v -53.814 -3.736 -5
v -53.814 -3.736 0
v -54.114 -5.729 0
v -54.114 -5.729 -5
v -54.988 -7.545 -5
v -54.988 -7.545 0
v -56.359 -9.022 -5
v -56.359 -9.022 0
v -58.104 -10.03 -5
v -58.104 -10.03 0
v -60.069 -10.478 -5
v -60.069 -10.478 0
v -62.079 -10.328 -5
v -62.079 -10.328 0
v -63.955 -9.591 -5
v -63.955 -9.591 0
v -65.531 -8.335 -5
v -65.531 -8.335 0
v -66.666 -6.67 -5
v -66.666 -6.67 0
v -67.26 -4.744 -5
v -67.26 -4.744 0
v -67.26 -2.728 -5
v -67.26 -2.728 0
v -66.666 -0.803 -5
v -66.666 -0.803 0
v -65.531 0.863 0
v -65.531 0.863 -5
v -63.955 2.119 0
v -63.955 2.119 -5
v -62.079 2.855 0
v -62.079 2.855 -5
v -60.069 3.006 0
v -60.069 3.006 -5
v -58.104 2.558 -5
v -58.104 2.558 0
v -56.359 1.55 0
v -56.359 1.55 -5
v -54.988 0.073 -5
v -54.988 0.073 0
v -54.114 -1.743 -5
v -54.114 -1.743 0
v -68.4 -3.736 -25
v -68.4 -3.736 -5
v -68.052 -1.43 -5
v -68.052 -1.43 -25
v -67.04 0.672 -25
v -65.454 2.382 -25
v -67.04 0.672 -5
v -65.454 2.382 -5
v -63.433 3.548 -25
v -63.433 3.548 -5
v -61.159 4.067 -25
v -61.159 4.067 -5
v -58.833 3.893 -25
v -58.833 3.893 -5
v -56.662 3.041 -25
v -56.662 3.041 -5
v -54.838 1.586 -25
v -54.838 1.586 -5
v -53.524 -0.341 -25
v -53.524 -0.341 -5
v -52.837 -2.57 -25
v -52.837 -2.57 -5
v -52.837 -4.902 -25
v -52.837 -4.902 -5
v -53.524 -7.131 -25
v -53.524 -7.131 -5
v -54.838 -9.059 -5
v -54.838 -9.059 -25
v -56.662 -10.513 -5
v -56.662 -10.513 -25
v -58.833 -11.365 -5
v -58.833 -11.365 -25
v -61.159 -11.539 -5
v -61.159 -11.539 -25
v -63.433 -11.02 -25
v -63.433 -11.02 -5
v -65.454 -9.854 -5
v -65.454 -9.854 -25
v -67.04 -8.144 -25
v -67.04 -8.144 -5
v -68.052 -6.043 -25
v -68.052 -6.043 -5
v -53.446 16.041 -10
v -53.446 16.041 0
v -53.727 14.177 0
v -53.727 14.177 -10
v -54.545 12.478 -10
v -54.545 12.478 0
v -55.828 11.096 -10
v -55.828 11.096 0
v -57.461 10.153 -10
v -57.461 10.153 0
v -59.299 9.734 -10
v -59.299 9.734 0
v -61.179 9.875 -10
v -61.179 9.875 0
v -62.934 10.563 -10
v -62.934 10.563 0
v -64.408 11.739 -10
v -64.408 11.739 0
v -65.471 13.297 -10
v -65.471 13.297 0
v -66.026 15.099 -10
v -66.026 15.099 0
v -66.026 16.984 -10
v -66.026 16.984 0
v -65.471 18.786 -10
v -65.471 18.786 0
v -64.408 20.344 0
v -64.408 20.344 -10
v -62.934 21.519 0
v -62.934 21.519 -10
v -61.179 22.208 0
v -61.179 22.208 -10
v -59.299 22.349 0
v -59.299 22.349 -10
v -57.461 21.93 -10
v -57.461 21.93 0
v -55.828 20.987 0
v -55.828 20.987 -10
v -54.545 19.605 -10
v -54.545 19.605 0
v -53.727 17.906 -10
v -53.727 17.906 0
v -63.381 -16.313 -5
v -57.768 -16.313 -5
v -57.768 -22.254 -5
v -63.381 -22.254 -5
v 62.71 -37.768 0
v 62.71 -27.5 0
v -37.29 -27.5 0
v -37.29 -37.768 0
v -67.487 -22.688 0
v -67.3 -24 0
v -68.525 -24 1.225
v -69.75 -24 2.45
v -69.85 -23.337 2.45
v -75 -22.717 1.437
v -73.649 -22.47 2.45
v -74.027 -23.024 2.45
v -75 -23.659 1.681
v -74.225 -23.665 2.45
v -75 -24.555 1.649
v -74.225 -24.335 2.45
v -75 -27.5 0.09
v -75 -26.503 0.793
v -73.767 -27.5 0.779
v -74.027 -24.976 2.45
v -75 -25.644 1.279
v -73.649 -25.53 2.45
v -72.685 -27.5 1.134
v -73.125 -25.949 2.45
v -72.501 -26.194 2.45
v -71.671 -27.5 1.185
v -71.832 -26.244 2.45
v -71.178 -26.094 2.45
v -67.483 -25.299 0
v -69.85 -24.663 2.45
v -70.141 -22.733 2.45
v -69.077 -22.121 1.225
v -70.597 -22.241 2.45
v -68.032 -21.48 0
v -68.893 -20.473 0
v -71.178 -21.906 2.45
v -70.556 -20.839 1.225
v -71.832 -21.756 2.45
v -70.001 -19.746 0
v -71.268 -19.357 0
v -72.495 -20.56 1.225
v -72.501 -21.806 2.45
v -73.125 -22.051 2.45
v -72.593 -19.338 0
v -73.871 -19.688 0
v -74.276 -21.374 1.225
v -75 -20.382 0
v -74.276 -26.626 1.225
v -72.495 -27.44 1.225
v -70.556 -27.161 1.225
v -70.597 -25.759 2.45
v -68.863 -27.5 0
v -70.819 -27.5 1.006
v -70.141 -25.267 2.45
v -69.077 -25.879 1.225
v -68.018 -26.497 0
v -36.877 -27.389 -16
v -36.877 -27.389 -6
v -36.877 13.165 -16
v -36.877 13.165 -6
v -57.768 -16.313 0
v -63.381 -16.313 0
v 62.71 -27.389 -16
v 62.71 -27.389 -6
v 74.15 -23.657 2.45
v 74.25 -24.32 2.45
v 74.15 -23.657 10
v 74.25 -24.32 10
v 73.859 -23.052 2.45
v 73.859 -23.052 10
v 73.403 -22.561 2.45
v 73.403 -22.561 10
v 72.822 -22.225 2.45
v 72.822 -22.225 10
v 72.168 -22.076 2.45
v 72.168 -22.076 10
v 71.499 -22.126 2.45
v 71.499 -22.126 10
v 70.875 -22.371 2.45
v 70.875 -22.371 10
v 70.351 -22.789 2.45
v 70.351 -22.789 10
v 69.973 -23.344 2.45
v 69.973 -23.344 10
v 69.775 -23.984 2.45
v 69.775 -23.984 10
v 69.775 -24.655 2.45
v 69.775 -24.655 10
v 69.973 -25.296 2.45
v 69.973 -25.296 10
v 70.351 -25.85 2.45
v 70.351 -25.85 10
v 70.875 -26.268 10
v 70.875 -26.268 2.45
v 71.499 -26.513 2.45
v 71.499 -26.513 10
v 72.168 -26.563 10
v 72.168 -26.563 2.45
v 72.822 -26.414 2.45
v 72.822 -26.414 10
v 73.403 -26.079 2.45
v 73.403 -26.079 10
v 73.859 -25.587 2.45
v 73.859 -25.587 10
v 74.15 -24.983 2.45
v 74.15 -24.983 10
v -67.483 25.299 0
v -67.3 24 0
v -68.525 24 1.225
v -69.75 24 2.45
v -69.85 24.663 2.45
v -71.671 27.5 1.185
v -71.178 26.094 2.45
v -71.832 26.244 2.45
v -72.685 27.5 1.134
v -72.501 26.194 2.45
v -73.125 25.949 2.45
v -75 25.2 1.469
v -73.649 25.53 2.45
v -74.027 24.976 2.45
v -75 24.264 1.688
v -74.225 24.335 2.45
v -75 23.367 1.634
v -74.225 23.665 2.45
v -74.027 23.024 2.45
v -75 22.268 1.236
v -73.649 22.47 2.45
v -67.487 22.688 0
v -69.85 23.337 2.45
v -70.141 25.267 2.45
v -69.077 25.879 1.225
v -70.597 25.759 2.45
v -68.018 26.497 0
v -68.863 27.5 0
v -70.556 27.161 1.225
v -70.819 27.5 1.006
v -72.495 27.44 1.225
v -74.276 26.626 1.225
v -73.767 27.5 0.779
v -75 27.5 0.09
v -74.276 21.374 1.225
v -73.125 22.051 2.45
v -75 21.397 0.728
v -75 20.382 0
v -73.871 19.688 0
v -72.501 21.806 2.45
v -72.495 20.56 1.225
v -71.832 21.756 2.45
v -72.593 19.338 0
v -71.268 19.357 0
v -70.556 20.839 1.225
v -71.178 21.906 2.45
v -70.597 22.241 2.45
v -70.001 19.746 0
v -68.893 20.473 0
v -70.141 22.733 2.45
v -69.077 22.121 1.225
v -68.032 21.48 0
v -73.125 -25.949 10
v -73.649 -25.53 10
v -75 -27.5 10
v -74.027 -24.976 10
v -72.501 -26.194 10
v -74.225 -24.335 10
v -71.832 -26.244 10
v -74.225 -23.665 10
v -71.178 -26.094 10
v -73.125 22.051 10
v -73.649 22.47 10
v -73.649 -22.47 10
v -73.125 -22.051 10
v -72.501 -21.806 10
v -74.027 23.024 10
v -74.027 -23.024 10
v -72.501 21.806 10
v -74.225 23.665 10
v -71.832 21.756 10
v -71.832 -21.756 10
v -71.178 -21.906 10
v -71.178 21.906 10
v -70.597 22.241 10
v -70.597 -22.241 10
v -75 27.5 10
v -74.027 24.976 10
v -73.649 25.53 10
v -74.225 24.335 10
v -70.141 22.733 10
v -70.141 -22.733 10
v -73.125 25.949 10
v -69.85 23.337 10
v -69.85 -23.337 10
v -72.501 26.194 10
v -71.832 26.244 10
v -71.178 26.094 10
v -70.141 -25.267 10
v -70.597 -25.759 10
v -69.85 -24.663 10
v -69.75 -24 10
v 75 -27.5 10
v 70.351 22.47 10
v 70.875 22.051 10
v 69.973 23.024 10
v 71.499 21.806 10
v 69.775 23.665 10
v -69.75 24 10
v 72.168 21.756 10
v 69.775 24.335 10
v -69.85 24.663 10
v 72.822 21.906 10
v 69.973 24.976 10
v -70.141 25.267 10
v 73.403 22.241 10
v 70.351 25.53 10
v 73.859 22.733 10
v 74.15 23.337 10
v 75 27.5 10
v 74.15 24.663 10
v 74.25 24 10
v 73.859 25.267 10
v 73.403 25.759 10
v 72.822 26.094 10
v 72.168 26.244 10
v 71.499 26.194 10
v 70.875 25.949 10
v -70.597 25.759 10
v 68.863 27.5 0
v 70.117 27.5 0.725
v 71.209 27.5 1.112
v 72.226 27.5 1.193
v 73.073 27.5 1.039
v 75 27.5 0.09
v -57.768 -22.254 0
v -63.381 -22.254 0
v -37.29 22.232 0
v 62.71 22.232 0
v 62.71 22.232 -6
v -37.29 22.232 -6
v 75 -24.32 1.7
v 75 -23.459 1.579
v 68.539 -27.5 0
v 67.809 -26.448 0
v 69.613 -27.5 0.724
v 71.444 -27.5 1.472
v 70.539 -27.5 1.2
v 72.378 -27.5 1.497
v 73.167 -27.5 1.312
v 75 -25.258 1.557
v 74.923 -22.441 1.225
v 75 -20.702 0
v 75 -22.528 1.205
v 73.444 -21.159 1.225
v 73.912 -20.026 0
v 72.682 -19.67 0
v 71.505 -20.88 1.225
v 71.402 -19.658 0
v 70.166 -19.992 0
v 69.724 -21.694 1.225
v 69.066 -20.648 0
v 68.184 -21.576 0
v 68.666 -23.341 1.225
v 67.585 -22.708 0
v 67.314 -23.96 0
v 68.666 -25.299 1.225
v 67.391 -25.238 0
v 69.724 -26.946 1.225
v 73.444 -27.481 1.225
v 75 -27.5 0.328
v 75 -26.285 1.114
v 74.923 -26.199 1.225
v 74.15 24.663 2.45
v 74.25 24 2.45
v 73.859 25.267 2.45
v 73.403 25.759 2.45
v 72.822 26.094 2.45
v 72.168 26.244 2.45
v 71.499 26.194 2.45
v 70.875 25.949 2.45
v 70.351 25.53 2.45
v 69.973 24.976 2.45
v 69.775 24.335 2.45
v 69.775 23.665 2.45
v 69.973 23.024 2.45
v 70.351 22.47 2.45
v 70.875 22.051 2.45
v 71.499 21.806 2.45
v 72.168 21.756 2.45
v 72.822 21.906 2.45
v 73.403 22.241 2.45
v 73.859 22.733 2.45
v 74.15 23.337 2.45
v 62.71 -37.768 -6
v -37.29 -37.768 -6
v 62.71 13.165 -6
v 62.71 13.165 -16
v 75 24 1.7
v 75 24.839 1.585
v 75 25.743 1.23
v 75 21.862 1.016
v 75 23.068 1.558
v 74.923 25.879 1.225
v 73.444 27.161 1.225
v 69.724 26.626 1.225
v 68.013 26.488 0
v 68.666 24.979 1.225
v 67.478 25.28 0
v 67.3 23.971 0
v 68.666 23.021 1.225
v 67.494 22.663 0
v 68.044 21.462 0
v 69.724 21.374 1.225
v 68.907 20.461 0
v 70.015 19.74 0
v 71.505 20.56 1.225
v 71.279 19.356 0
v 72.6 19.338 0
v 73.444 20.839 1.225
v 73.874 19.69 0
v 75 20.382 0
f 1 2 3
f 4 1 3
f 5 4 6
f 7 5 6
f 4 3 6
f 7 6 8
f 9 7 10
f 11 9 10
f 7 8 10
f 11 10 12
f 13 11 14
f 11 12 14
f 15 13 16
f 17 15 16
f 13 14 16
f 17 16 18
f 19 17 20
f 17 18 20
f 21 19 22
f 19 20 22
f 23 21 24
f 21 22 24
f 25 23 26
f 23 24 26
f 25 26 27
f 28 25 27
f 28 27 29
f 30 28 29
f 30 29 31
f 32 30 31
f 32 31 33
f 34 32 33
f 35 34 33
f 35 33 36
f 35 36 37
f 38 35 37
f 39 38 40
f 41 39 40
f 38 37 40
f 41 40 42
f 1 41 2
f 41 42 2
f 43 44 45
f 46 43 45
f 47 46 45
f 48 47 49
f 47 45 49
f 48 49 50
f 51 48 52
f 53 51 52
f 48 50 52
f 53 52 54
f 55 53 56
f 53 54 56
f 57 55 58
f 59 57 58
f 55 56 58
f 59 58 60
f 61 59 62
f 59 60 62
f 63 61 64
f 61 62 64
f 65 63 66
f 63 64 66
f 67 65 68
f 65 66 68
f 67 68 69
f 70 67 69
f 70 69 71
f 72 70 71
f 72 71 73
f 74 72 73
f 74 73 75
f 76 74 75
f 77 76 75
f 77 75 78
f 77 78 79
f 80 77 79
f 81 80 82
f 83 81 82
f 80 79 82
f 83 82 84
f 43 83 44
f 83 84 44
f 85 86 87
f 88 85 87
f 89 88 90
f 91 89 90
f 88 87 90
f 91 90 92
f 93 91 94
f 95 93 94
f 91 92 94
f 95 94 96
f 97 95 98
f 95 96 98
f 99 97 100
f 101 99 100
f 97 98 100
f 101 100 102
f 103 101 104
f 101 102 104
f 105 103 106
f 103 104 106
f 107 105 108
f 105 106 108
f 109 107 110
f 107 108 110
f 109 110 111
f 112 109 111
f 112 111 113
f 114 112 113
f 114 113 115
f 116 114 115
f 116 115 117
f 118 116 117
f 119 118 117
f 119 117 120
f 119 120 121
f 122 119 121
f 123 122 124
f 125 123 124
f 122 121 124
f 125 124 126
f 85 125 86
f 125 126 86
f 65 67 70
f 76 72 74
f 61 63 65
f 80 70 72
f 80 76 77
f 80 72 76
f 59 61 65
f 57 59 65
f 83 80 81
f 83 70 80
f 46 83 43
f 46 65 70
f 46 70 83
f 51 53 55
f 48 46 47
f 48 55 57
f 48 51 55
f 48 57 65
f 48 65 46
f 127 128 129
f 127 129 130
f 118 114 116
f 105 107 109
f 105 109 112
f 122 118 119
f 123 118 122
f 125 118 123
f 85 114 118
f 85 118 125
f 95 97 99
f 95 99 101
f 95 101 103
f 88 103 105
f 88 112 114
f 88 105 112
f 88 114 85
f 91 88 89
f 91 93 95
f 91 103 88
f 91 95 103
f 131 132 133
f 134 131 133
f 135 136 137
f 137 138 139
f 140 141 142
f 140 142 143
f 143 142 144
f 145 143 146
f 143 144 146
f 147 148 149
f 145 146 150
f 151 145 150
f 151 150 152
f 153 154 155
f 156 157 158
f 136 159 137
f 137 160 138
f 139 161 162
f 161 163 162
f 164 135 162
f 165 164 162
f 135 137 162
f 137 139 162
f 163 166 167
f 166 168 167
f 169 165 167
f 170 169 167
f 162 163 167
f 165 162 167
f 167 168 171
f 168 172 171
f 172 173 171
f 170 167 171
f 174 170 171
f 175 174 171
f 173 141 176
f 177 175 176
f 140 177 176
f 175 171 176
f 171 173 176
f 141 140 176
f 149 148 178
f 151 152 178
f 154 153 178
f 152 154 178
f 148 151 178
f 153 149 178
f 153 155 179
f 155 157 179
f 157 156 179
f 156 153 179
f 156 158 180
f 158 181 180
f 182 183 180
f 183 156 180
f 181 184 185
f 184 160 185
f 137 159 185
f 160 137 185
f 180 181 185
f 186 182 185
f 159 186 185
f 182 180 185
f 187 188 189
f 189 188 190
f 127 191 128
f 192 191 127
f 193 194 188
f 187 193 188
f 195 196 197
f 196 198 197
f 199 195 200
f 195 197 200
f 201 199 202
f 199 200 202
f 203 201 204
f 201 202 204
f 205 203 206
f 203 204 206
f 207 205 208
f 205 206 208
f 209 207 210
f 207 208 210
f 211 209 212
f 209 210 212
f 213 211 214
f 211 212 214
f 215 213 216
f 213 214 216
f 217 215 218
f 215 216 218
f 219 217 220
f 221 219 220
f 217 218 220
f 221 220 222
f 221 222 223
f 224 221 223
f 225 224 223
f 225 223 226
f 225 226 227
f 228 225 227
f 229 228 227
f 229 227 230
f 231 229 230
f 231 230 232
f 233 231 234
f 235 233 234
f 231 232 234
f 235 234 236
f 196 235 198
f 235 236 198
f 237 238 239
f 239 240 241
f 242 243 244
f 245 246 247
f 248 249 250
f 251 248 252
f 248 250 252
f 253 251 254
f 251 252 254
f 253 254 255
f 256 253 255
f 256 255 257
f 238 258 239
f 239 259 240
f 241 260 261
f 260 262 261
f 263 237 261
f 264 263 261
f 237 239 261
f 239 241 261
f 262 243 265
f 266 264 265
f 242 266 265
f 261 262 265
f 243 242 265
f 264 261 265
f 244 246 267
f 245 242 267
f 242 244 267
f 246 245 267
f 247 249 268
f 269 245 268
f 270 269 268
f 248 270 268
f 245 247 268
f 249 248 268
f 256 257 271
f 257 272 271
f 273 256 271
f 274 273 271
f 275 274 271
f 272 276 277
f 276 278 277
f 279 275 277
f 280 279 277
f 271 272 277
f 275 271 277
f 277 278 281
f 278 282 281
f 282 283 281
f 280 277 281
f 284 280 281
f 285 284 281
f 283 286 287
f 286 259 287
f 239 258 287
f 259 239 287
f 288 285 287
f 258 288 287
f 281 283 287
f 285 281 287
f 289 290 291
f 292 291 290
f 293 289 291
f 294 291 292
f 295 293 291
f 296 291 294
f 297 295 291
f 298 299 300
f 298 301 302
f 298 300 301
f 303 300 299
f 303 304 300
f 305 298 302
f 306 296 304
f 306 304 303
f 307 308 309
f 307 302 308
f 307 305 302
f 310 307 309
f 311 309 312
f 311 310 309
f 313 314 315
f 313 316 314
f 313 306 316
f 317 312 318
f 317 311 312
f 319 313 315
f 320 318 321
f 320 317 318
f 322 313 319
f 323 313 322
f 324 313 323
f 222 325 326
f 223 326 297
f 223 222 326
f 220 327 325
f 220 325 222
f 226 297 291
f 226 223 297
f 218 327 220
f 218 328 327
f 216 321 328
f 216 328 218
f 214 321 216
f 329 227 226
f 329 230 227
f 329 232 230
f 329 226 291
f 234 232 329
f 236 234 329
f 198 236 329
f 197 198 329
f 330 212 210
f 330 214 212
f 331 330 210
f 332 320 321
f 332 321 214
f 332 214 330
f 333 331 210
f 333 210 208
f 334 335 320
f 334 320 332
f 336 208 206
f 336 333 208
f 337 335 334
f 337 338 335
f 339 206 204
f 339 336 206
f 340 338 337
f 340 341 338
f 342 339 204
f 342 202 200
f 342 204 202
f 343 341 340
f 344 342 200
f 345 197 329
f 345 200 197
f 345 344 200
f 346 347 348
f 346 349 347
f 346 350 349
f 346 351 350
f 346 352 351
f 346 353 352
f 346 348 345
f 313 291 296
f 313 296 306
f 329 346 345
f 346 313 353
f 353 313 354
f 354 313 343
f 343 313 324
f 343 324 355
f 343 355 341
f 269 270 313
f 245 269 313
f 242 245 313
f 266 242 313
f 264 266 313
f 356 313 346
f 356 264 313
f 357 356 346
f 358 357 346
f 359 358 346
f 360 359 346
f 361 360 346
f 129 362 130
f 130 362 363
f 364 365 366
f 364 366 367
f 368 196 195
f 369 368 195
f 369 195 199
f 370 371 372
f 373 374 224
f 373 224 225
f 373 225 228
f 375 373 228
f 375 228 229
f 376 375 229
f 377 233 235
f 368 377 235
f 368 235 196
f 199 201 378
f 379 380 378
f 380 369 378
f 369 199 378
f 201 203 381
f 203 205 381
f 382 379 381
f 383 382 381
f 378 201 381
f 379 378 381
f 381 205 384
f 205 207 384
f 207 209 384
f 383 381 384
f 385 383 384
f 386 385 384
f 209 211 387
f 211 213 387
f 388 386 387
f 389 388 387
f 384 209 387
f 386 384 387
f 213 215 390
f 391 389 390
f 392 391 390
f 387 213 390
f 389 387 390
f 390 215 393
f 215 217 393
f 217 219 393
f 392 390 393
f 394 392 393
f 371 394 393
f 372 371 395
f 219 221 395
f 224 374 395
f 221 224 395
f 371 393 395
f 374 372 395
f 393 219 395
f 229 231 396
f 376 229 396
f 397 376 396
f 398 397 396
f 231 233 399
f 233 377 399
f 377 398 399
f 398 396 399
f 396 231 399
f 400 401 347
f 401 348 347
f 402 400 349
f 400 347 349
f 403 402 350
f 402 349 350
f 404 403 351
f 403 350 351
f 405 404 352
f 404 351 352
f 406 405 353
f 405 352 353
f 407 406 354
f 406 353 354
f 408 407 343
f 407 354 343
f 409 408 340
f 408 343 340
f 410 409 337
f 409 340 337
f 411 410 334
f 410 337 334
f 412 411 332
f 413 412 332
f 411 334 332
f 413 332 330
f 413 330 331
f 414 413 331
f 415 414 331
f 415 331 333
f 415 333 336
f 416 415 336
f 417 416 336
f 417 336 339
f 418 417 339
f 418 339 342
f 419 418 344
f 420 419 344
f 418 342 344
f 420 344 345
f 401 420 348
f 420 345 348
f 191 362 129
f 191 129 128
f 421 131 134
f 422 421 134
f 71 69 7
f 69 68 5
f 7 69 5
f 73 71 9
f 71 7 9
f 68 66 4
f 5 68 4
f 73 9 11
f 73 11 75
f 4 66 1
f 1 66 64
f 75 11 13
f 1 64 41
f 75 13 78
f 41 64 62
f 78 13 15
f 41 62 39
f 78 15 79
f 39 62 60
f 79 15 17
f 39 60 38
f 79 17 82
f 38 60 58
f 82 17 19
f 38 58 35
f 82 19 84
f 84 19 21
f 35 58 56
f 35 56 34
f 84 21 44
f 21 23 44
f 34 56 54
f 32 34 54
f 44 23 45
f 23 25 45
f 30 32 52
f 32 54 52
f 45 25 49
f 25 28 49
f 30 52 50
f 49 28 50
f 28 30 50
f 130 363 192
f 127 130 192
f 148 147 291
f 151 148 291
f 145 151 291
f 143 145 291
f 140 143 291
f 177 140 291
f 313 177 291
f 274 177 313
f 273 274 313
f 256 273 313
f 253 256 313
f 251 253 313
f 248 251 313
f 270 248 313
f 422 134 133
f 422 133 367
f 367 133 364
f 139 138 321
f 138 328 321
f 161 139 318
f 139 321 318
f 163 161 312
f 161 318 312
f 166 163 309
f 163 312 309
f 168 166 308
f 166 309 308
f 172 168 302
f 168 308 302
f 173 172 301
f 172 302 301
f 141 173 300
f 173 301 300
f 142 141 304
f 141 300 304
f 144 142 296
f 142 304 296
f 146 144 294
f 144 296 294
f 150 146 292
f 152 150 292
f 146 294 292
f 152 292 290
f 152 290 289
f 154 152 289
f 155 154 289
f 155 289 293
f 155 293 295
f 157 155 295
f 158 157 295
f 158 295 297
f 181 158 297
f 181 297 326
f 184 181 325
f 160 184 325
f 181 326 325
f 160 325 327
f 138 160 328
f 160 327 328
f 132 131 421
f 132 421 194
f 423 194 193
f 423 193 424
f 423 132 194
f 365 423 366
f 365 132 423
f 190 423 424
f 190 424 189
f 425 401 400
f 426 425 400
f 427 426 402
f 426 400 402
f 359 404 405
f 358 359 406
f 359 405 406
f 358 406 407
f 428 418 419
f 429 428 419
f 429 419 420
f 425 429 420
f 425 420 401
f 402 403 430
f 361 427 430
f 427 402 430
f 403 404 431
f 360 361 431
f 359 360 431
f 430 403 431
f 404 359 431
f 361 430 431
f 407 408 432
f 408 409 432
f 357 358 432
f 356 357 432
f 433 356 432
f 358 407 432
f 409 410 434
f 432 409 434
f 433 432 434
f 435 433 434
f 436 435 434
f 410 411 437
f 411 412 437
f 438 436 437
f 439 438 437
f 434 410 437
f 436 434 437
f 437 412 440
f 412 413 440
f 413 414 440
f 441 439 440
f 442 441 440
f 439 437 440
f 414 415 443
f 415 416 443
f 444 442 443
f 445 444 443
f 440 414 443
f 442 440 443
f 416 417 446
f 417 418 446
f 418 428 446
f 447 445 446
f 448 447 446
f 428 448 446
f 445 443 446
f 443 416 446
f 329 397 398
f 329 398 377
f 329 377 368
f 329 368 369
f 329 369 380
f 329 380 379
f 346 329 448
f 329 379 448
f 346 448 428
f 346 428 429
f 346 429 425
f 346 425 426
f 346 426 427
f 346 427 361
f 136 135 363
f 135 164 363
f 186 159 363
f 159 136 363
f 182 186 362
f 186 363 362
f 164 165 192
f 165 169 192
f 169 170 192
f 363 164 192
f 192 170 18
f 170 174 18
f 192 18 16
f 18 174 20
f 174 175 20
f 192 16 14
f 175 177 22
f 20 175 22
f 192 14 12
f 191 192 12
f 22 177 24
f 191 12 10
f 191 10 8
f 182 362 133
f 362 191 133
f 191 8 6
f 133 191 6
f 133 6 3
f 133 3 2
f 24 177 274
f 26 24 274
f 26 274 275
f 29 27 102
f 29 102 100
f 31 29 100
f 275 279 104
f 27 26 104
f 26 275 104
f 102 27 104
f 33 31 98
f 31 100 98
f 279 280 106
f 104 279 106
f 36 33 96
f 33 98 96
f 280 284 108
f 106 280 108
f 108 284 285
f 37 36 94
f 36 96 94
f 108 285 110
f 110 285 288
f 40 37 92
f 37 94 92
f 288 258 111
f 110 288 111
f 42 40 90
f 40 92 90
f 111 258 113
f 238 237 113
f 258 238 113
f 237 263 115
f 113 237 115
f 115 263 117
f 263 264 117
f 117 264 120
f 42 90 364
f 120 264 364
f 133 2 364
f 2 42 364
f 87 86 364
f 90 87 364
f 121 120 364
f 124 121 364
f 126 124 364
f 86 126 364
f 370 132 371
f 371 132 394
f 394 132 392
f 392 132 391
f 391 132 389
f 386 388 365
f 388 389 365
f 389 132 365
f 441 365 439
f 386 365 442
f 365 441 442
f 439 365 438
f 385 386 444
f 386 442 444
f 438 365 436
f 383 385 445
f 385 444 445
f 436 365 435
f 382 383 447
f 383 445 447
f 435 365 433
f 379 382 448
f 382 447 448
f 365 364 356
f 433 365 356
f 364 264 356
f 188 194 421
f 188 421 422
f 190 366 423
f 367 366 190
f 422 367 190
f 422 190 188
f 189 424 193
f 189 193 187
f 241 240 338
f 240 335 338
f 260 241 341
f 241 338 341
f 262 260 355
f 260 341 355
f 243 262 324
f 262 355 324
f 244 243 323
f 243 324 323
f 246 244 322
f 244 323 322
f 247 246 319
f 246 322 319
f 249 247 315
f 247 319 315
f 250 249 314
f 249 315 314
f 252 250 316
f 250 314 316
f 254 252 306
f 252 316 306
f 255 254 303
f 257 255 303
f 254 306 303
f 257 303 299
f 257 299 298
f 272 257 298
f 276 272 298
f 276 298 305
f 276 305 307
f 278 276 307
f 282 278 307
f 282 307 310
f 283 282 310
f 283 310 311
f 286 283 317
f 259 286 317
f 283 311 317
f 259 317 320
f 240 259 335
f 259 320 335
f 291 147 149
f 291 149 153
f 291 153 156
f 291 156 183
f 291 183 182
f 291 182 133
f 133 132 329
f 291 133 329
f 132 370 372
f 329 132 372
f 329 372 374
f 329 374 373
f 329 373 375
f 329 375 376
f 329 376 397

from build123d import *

# Parameters (mm, degrees)
SKETCH1_W                                           = 150
SKETCH1_H                                           = 55
BOSS_EXTRUDE1_DEPTH                                 = 10
CSK_FOR_M4_COUNTERSUNK_FLAT_HEAD_SCREW1_D           = 4.5
CSK_FOR_M4_COUNTERSUNK_FLAT_HEAD_SCREW1_CSINK_D     = 9.4
CSK_FOR_M4_COUNTERSUNK_FLAT_HEAD_SCREW1_CSINK_ANGLE = 90
SKETCH4_W                                           = 100
SKETCH4_H                                           = 60
BOSS_EXTRUDE2_DEPTH                                 = 6
SKETCH5_W                                           = 99.587167191
SKETCH5_H                                           = 40.554359572
BOSS_EXTRUDE3_DEPTH                                 = 10
SKETCH6_R                                           = 6.325350673
BOSS_EXTRUDE4_DEPTH                                 = 10
SKETCH7_R                                           = 6.761038659
SKETCH7_W                                           = 5.613398263
SKETCH7_H                                           = 5.940244602
BOSS_EXTRUDE5_DEPTH                                 = 5
SKETCH8_R                                           = 7.825257062
BOSS_EXTRUDE6_DEPTH                                 = 20


with BuildPart() as part:
    # Sketch1 → Boss-Extrude1 (new body)
    with BuildSketch(Plane.XY):
        Rectangle(SKETCH1_W, SKETCH1_H)
    extrude(amount=BOSS_EXTRUDE1_DEPTH)

    # CSK for M4 Countersunk Flat Head Screw1 (through all)
    with Locations(Plane(origin=(0, 0, 0), x_dir=(-1, 0, 0), z_dir=(0, 0, -1))):
        with Locations((-72, 24), (-72, -24.31977753), (72, -24), (72, 24)):
            CounterSinkHole(CSK_FOR_M4_COUNTERSUNK_FLAT_HEAD_SCREW1_D / 2, CSK_FOR_M4_COUNTERSUNK_FLAT_HEAD_SCREW1_CSINK_D / 2, counter_sink_angle=CSK_FOR_M4_COUNTERSUNK_FLAT_HEAD_SCREW1_CSINK_ANGLE)

    # Sketch4 → Boss-Extrude2 (add)
    with BuildSketch(Plane(origin=(0, 0, 0), x_dir=(-1, 0, 0), z_dir=(0, 0, -1))):
        with Locations((-12.709987385, -7.767861044)):
            Rectangle(SKETCH4_W, SKETCH4_H)
    extrude(amount=BOSS_EXTRUDE2_DEPTH)

    # Sketch5 → Boss-Extrude3 (add)
    with BuildSketch(Plane(origin=(0, 0, -6), x_dir=(-1, 0, 0), z_dir=(0, 0, -1))):
        with Locations((-12.91640379, -7.112004415)):
            Rectangle(SKETCH5_W, SKETCH5_H)
    extrude(amount=BOSS_EXTRUDE3_DEPTH)

    # Sketch6 → Boss-Extrude4 (add)
    with BuildSketch(Plane(origin=(0, 0, 0), x_dir=(-1, 0, 0), z_dir=(0, 0, -1))):
        with Locations(Location((59.771620242, 16.04141059, 0), (0, 0, 180))):
            Circle(SKETCH6_R)
    extrude(amount=BOSS_EXTRUDE4_DEPTH)

    # Sketch7 → Boss-Extrude5 (add)
    with BuildSketch(Plane(origin=(0, 0, 0), x_dir=(-1, 0, 0), z_dir=(0, 0, -1))):
        with Locations(Location((60.574566505, -3.736064786, 0), (0, 0, 180))):
            Circle(SKETCH7_R)
        with Locations((60.574566506, -19.28347932)):
            Rectangle(SKETCH7_W, SKETCH7_H)
    extrude(amount=BOSS_EXTRUDE5_DEPTH)

    # Sketch8 → Boss-Extrude6 (add)
    with BuildSketch(Plane(origin=(0, 0, -5), x_dir=(-1, 0, 0), z_dir=(0, 0, -1))):
        with Locations((60.574566505, -3.736064786)):
            Circle(SKETCH8_R)
    extrude(amount=BOSS_EXTRUDE6_DEPTH)


solid = part.part
